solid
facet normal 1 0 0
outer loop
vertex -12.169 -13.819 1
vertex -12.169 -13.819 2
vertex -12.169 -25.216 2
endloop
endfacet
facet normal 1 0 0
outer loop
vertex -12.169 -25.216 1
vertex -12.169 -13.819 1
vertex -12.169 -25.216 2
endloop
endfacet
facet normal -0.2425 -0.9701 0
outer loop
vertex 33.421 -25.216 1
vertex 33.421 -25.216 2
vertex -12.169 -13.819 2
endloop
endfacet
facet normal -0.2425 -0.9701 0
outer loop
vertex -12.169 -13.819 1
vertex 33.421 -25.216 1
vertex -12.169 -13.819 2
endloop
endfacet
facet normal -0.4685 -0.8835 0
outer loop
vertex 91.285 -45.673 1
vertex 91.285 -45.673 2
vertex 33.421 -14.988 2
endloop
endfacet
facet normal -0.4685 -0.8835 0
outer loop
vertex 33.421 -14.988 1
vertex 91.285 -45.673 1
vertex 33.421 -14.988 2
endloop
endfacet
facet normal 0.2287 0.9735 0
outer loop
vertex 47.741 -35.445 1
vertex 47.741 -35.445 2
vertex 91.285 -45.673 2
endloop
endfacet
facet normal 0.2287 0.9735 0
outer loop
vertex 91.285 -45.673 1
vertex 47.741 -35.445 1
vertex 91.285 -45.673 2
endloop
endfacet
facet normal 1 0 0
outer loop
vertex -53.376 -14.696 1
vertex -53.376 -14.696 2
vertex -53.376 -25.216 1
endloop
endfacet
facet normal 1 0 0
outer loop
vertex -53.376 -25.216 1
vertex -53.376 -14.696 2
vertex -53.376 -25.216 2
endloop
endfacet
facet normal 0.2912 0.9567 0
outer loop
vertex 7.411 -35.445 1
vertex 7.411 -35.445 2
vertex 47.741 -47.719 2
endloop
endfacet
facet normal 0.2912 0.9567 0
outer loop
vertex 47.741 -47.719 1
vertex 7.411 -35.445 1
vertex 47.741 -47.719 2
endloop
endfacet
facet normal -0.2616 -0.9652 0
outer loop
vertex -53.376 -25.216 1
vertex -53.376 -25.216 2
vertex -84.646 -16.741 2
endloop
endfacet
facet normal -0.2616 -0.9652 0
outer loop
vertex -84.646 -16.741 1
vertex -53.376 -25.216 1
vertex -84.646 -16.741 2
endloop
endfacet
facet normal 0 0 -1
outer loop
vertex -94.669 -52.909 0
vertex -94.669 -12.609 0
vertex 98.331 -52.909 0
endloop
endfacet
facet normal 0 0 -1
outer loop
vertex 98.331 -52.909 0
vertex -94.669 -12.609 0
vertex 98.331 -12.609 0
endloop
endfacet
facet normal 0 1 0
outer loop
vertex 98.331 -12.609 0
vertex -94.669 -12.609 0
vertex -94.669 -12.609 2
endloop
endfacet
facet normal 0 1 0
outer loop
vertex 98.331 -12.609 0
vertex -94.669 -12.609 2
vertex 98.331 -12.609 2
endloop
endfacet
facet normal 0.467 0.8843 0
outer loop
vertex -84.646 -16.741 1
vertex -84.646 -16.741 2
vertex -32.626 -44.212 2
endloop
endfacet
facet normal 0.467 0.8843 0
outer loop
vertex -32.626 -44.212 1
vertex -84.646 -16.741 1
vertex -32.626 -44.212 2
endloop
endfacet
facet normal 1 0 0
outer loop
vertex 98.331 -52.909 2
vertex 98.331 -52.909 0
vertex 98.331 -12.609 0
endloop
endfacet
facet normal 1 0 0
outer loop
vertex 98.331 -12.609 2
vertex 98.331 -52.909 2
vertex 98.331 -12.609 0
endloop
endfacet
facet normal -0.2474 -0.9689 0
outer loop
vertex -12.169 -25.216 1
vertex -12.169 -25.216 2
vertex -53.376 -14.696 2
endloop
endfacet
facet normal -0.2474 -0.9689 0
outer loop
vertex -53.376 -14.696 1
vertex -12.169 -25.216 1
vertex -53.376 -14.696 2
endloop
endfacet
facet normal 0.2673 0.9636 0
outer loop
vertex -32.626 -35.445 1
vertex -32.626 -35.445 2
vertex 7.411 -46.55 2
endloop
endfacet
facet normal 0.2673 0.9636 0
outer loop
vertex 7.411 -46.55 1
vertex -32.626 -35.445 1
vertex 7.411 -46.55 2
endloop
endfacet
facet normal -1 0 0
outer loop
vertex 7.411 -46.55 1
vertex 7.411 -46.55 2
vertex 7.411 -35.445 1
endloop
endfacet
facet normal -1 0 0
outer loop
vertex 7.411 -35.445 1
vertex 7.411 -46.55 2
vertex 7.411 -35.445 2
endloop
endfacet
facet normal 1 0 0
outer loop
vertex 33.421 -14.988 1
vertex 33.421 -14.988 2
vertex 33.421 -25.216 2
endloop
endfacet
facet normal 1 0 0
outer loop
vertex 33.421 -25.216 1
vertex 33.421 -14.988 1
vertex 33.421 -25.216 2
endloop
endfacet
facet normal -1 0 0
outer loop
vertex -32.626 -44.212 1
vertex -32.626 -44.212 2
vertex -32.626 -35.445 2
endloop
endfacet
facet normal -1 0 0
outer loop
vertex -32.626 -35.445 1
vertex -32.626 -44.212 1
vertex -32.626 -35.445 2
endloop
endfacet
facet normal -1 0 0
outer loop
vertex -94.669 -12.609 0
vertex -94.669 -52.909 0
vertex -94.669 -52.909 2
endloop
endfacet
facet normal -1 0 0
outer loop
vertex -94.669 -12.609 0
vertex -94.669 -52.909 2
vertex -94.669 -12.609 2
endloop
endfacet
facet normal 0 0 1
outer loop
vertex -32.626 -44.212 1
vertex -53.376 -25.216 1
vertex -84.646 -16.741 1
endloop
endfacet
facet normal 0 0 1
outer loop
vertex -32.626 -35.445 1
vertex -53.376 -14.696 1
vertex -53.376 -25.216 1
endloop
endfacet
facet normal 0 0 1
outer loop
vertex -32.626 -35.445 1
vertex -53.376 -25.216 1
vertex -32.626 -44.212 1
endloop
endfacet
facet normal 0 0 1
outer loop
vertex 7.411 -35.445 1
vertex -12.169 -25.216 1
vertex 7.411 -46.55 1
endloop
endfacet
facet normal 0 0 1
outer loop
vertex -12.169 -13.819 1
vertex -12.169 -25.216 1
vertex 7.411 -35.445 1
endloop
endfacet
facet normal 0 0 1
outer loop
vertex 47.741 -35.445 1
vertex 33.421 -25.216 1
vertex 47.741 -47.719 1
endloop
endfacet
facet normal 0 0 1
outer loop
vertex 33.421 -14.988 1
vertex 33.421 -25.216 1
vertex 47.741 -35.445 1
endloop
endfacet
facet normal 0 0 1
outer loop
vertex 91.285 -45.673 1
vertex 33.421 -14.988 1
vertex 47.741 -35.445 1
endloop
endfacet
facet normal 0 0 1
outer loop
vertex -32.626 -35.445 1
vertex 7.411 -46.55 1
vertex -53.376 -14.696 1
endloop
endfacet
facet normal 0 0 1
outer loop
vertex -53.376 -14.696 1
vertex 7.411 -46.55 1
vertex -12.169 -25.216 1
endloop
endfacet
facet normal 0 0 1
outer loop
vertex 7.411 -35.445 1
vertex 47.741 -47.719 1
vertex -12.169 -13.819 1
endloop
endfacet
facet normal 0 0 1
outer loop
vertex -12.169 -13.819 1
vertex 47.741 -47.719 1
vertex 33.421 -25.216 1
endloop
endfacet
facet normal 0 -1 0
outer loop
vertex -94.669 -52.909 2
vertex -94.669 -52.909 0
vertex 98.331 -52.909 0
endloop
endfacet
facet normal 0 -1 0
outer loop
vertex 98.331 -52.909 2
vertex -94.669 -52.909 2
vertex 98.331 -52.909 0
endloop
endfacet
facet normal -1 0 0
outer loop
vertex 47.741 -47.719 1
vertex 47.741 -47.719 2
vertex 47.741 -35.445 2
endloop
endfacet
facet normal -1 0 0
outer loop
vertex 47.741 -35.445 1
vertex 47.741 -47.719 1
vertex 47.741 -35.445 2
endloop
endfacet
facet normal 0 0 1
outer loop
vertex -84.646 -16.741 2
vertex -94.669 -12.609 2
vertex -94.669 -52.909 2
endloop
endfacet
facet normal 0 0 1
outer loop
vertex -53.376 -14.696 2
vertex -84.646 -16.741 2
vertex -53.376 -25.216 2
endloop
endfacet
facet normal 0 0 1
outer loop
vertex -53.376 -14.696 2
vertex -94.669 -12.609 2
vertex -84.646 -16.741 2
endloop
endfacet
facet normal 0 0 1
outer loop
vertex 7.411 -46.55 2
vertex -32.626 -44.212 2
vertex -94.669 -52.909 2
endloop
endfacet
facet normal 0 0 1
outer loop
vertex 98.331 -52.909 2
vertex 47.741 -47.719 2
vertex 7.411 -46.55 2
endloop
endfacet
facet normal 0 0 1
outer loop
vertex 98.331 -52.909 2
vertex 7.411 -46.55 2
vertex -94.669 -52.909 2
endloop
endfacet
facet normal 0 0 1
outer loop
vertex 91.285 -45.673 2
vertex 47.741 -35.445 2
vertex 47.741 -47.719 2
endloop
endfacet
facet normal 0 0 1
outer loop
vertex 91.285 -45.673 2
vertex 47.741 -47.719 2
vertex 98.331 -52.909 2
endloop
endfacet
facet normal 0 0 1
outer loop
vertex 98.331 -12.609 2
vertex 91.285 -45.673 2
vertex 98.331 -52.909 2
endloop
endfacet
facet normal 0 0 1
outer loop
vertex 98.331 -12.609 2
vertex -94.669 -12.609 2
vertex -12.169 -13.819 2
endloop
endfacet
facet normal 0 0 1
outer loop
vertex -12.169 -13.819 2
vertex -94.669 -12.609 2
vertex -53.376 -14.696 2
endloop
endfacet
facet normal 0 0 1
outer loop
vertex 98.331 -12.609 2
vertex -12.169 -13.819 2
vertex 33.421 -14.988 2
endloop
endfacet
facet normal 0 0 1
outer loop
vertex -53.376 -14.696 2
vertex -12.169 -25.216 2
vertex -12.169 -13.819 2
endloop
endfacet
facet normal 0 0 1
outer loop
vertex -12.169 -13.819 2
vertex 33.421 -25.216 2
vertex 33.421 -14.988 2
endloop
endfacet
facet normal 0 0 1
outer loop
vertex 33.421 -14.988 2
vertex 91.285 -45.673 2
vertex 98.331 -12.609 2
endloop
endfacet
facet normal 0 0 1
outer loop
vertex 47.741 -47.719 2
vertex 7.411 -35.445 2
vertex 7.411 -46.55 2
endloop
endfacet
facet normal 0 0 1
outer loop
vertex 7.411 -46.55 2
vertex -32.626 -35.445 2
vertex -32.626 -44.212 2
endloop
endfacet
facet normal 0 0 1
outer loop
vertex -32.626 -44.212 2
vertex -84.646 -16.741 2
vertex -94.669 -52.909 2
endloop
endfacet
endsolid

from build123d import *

# Parameters (mm, degrees)
F0_W     = 193
F0_H     = 40.3
F1_DEPTH = 2
F3_DEPTH = 1


with BuildPart() as f1:
    # F0 (on Top) → F1 (new body)
    with BuildSketch(Plane.XY):
        with Locations((1.831396, -32.759346)):
            Rectangle(F0_W, F0_H)
    extrude(amount=F1_DEPTH)

    # F2 (on face) → F3 (cut)
    with BuildSketch(Plane.XY.offset(2)):
        Polygon((-53.375542, -25.216417), (-84.645547, -16.741371), (-32.626286, -44.212215), (-32.626286, -35.444923), (7.411011, -46.550158), (7.411011, -35.444923), (47.740549, -47.719132), (47.740549, -35.444923), (91.284759, -45.67343), (33.420641, -14.987911), (33.420641, -25.216417), (-12.169273, -13.818938), (-12.169273, -25.216417), (-53.375542, -14.695669), align=None)
    extrude(amount=-F3_DEPTH, mode=Mode.SUBTRACT)


solid = f1.part
